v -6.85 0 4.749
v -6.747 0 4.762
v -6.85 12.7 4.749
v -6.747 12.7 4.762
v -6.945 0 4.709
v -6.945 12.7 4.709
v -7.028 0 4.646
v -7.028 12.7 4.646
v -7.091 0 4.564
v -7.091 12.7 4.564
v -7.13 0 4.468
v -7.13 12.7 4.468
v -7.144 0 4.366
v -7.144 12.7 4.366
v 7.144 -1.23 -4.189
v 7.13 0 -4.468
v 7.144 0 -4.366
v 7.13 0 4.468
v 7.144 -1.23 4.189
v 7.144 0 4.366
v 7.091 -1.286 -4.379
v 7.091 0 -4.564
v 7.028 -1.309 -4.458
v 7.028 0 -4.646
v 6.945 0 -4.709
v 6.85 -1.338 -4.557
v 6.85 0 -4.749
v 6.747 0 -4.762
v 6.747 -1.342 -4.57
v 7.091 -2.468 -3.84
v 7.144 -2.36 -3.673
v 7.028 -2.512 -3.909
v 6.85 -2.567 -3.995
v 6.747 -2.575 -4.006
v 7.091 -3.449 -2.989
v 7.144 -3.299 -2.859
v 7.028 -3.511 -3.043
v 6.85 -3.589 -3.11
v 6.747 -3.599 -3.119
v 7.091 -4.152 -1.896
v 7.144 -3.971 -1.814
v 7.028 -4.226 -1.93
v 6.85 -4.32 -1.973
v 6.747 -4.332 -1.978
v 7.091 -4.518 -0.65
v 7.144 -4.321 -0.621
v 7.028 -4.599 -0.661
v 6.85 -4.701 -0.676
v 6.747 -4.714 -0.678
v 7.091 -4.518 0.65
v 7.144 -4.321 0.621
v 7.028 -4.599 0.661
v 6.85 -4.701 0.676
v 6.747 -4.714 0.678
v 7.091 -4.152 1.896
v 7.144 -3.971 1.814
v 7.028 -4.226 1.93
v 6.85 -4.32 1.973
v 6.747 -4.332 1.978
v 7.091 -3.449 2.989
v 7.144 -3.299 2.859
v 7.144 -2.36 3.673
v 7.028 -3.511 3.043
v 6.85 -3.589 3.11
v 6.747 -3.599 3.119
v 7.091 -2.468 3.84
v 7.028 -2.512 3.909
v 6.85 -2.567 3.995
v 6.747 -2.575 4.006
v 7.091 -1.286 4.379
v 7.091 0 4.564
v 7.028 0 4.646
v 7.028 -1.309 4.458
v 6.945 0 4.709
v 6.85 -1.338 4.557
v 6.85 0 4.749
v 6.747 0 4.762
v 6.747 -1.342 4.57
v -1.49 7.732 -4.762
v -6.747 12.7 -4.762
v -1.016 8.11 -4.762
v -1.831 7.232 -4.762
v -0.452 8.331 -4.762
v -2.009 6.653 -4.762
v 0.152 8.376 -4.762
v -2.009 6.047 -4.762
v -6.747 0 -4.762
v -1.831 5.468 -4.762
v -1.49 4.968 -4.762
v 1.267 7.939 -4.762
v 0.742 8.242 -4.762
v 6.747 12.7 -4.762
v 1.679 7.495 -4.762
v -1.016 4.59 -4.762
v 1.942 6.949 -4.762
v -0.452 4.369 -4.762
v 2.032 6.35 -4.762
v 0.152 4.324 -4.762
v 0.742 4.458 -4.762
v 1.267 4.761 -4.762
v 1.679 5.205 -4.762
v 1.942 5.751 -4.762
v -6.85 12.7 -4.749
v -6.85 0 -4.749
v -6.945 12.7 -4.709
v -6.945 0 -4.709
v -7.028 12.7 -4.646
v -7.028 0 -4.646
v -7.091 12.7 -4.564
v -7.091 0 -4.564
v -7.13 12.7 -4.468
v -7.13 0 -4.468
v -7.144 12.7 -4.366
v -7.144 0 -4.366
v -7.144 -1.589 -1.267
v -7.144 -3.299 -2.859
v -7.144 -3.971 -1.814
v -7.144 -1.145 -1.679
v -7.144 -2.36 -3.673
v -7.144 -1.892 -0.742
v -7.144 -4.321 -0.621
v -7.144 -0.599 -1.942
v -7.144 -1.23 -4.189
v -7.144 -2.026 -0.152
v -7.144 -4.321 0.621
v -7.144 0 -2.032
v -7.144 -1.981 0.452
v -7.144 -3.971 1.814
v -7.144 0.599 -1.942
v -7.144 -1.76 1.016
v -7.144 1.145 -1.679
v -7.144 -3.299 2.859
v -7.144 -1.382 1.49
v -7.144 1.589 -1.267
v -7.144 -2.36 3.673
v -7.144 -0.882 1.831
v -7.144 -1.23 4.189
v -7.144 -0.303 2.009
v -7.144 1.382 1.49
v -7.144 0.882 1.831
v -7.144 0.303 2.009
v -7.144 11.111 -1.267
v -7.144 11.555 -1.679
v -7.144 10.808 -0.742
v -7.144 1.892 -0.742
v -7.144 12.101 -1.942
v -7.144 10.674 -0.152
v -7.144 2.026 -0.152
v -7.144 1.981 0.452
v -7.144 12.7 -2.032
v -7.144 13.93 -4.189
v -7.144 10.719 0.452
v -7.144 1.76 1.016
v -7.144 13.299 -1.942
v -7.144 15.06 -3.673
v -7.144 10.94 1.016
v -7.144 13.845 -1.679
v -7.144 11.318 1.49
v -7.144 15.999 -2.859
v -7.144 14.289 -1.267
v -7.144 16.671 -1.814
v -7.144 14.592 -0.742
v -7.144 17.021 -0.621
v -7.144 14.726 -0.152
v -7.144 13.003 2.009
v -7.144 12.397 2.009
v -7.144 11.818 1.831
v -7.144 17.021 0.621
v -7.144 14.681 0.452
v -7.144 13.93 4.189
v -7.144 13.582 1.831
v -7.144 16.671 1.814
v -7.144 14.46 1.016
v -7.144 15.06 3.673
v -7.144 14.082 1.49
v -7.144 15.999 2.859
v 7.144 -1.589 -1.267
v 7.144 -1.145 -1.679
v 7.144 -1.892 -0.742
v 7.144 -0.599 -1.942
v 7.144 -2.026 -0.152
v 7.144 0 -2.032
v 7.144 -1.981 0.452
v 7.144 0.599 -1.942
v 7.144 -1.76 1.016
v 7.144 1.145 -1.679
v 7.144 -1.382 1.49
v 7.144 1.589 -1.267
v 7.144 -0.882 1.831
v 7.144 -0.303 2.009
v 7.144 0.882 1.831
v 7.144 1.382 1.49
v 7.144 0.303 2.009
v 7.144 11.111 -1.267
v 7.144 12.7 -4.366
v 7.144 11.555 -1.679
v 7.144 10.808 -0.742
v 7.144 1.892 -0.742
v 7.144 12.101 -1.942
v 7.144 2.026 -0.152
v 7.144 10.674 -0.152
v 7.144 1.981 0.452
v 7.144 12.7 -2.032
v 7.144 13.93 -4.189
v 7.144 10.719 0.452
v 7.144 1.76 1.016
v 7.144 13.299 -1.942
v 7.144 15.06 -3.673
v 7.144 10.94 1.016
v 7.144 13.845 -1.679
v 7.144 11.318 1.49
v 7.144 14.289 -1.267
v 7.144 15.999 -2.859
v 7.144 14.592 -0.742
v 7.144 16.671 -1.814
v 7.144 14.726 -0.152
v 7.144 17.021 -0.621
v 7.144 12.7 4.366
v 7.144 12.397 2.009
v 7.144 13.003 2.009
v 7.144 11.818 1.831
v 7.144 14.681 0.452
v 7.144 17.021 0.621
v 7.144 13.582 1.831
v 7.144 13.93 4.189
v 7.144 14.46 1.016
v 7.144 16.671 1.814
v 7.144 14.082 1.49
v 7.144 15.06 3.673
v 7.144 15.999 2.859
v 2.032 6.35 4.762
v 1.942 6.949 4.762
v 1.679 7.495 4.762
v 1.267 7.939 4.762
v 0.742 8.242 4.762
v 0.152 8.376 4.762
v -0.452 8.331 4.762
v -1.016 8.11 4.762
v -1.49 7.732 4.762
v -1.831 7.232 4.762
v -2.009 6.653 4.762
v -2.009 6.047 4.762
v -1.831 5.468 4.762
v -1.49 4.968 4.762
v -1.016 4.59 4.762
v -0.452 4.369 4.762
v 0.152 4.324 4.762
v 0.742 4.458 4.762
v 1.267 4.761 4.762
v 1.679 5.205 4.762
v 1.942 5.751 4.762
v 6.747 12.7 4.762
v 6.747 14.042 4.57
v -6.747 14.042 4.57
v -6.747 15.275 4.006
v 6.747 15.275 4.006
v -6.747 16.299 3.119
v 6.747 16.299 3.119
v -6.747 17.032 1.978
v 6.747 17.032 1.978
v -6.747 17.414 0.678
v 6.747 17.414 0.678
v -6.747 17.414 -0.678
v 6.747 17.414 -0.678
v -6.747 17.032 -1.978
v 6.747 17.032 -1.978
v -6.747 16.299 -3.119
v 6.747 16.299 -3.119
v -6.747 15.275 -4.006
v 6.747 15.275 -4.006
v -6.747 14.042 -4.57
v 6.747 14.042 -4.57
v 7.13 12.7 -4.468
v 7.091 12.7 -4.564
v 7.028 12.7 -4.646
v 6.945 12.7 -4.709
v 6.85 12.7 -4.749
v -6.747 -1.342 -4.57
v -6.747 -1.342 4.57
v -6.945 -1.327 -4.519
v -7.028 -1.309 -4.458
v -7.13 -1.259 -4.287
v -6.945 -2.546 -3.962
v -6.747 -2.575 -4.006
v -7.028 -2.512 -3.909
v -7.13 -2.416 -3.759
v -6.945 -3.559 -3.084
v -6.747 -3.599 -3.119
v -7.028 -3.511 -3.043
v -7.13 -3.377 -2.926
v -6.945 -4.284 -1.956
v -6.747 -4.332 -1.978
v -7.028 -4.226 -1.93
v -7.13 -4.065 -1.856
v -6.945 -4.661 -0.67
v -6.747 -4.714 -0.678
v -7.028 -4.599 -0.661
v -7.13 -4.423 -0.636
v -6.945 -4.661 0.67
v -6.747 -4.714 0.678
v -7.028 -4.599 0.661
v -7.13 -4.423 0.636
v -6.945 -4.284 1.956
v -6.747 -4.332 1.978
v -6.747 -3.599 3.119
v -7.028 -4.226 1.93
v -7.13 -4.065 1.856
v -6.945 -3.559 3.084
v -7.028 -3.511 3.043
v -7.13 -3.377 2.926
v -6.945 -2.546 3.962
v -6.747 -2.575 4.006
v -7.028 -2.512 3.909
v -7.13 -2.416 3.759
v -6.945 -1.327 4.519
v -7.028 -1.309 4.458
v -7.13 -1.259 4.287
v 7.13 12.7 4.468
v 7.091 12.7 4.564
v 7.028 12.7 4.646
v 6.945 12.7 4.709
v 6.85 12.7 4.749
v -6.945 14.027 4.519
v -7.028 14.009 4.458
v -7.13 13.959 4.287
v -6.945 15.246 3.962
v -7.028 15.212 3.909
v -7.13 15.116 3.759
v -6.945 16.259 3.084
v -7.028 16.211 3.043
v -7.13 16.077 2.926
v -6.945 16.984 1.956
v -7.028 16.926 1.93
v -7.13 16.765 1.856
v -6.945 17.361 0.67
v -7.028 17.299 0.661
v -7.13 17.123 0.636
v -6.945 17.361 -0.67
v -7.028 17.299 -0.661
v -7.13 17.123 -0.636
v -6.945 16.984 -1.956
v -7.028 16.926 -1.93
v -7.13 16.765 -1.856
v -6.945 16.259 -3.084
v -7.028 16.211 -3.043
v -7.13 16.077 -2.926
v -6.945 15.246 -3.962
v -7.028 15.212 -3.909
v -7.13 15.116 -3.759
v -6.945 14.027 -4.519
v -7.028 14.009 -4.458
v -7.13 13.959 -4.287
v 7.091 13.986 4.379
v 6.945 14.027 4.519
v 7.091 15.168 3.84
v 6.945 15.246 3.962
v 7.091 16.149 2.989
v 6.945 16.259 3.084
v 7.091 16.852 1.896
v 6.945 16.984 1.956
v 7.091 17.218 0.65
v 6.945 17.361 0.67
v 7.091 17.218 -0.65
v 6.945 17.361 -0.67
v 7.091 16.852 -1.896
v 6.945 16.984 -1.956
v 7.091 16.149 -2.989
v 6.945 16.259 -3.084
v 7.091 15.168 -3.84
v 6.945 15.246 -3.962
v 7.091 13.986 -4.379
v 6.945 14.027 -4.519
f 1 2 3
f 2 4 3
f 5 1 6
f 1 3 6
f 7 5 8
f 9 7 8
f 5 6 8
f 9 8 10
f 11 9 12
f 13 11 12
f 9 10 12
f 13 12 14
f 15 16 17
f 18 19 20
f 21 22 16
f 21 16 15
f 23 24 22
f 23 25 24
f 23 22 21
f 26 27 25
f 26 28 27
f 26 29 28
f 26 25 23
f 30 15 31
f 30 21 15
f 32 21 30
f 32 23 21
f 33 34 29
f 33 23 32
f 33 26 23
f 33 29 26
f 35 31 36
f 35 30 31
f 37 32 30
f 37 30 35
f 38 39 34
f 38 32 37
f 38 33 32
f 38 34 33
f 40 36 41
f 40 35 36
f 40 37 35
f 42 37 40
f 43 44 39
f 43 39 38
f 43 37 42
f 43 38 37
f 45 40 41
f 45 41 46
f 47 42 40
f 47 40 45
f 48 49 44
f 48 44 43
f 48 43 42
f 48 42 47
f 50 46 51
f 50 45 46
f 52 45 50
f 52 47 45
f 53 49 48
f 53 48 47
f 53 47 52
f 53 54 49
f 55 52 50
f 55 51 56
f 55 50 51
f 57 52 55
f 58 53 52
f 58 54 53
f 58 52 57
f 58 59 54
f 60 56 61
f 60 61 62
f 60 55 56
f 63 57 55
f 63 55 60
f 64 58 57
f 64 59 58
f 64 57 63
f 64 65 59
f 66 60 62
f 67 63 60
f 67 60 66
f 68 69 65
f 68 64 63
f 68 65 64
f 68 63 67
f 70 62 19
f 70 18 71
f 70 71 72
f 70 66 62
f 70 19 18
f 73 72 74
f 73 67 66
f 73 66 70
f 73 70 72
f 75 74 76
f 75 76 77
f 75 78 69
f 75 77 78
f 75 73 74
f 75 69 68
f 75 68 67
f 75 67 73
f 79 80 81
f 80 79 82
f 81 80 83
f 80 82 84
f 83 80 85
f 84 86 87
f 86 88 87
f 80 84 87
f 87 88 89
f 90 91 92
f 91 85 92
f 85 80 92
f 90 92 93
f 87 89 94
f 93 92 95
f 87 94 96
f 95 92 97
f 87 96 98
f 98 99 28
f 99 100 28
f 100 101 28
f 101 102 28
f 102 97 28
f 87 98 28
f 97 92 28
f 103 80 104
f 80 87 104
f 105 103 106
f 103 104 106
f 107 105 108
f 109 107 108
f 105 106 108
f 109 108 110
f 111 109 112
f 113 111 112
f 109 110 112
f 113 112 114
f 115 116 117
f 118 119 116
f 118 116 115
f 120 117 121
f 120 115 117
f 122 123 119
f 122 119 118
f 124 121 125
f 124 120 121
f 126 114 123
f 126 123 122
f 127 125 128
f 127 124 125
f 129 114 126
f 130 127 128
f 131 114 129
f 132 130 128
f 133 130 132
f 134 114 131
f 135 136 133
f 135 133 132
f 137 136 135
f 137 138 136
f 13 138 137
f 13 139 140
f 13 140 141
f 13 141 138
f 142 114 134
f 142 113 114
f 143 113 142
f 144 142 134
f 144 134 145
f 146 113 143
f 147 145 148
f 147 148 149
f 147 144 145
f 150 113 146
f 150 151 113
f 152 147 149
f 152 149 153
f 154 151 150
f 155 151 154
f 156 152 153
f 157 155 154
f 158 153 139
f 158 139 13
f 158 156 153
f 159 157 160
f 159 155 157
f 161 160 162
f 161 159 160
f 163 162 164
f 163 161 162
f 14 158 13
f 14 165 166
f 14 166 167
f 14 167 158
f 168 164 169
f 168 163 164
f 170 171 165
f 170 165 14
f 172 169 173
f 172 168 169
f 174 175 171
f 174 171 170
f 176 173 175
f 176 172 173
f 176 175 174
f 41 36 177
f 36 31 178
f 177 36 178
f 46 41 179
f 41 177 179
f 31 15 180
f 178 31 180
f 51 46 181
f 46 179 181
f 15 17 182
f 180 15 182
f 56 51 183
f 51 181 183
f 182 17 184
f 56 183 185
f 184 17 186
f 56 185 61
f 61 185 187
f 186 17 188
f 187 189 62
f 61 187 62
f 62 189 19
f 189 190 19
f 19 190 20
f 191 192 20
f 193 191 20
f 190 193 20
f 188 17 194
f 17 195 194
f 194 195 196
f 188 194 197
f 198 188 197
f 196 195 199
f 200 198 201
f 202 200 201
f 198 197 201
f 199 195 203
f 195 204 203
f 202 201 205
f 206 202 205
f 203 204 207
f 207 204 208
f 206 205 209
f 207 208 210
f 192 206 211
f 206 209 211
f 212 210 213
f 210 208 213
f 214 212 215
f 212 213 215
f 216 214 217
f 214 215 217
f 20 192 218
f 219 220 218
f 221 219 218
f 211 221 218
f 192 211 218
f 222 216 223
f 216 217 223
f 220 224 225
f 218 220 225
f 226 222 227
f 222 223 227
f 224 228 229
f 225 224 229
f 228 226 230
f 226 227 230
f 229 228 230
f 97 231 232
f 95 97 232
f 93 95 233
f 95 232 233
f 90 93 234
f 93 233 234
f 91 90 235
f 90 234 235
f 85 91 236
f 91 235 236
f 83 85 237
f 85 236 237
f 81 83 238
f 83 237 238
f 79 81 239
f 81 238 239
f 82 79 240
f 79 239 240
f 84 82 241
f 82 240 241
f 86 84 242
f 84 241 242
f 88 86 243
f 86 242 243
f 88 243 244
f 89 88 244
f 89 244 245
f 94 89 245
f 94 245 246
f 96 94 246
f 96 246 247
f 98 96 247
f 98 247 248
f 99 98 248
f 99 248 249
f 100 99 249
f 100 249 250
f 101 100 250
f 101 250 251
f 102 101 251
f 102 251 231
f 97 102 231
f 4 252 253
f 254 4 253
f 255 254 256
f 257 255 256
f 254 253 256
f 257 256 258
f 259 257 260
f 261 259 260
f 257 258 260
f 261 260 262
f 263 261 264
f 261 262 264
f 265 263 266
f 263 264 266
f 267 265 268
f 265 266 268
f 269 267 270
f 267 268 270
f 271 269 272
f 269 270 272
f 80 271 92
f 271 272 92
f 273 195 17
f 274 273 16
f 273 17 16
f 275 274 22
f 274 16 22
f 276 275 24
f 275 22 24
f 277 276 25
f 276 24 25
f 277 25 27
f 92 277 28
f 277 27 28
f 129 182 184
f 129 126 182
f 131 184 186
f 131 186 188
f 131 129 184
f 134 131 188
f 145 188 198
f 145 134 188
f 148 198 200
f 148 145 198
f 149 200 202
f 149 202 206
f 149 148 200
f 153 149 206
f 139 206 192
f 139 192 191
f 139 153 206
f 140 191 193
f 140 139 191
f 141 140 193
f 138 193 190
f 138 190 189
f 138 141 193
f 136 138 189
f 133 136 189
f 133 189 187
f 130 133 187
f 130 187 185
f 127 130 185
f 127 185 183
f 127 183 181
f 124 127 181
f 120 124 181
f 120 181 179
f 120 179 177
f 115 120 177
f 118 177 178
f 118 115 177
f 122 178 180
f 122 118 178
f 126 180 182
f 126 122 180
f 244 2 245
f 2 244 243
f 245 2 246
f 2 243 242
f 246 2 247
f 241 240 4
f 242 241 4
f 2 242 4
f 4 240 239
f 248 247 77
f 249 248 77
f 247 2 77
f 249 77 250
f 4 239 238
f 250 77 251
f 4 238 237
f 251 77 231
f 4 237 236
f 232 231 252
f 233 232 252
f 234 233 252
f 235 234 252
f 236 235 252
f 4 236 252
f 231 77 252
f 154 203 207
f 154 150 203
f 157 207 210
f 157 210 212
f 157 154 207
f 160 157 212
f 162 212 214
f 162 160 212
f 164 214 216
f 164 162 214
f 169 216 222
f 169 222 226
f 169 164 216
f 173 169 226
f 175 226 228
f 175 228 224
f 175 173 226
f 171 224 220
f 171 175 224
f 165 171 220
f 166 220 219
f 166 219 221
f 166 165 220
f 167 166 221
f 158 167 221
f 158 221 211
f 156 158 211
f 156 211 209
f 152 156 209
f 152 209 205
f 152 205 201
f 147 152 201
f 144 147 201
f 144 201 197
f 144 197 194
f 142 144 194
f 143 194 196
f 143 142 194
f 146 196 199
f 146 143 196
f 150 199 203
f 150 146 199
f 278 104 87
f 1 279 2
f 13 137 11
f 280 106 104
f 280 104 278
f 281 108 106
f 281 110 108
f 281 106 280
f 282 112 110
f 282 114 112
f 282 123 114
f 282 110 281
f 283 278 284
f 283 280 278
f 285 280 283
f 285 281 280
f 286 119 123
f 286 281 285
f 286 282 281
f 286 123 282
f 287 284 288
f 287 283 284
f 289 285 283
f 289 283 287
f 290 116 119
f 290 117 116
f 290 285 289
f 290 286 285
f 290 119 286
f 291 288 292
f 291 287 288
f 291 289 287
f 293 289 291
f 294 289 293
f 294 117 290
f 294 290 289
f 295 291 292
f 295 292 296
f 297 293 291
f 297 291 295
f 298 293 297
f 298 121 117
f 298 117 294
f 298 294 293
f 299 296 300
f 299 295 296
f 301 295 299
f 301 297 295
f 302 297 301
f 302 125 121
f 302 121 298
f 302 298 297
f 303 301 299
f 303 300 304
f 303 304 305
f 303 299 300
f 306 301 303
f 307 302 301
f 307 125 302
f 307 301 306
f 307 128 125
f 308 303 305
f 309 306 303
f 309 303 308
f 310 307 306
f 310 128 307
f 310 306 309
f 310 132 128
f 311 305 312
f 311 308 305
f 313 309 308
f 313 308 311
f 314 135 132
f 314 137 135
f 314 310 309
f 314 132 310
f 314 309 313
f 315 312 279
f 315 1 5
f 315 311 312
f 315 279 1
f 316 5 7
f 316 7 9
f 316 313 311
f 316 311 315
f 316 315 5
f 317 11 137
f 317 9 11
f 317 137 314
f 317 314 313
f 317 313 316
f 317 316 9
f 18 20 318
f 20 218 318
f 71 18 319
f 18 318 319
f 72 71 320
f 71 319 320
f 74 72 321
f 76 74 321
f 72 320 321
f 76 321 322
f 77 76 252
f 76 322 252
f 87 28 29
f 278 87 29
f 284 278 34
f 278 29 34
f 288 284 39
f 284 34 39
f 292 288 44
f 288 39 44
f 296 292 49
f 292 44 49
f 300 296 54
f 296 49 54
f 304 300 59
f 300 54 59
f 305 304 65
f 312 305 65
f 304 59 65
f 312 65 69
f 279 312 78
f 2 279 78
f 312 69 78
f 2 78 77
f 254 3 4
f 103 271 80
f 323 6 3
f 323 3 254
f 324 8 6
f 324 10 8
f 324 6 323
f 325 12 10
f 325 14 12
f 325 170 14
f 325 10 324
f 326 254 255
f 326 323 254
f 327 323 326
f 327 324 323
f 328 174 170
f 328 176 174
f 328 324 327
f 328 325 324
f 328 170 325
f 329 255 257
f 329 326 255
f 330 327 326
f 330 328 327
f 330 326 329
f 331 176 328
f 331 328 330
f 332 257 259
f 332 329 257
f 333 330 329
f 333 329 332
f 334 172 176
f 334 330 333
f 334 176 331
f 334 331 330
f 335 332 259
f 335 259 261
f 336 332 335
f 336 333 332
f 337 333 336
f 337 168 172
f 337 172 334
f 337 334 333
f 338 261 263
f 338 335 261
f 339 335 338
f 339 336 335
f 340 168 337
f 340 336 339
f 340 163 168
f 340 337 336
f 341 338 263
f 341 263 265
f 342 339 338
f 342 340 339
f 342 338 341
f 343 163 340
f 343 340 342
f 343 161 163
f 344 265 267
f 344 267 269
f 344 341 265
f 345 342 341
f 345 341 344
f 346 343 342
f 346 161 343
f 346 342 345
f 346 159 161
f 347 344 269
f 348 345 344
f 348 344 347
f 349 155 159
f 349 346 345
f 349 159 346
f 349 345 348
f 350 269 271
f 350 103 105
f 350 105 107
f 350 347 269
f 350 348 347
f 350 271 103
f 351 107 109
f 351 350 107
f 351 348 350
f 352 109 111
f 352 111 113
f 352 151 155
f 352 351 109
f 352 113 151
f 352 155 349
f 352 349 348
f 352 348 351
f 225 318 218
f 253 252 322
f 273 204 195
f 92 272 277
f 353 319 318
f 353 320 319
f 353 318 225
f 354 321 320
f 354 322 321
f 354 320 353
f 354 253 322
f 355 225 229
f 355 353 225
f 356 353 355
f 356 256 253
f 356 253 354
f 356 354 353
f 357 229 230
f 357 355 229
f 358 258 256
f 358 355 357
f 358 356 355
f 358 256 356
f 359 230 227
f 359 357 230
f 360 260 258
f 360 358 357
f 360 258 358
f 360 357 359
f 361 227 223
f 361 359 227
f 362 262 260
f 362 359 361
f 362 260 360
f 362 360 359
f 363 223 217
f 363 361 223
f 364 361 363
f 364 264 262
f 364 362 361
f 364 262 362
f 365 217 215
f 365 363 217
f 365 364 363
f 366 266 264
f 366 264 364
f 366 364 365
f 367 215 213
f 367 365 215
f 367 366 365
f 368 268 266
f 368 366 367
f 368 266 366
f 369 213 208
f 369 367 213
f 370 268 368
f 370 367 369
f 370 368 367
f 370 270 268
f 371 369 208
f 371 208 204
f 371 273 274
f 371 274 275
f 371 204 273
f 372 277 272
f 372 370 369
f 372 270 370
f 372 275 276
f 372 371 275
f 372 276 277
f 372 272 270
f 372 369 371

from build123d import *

# Parameters (mm, degrees)
SKETCH1_R           = 2.032
BOSS_EXTRUDE1_DEPTH = 7.14375
SKETCH2_R           = 2.032
CUT_EXTRUDE1_DEPTH  = 22.135224042
FILLET1_R           = 0.396875


with BuildPart() as part:
    # Sketch1 → Boss-Extrude1 (new, symmetric)
    with BuildSketch(Plane(origin=(0, 0, 0), x_dir=(0, 0, -1), z_dir=(1, 0, 0))):
        with BuildLine():
            Line((-4.7625, 0), (-4.7625, 12.7))
            ThreePointArc((-4.7625, 12.7), (0, 17.4625), (4.7625, 12.7))
            Line((4.7625, 12.7), (4.7625, 0))
            ThreePointArc((4.7625, 0), (0, -4.7625), (-4.7625, 0))
        make_face()
        with Locations((0, 12.7)):
            Circle(SKETCH1_R, mode=Mode.SUBTRACT)
        Circle(SKETCH1_R, mode=Mode.SUBTRACT)
    extrude(amount=BOSS_EXTRUDE1_DEPTH, both=True)

    # Sketch2 → Cut-Extrude1 (cut, through all)
    with BuildSketch(Plane.XY.offset(4.7625)):
        with Locations((0, 6.35)):
            Circle(SKETCH2_R)
    extrude(amount=-CUT_EXTRUDE1_DEPTH, mode=Mode.SUBTRACT)

    # Fillet1
    fillet1_edges = [part.edges().sort_by_distance(p)[0] for p in [
        (7.14375, 17.4625, 0),
        (7.14375, 6.35, 4.7625),
        (7.14375, -4.7625, 0),
        (-7.14375, 6.35, 4.7625),
        (-7.14375, 17.4625, 0),
        (-7.14375, 6.35, -4.7625),
        (-7.14375, -4.7625, 0),
        (7.14375, 6.35, -4.7625),
    ]]
    fillet(fillet1_edges, radius=FILLET1_R)


solid = part.part
